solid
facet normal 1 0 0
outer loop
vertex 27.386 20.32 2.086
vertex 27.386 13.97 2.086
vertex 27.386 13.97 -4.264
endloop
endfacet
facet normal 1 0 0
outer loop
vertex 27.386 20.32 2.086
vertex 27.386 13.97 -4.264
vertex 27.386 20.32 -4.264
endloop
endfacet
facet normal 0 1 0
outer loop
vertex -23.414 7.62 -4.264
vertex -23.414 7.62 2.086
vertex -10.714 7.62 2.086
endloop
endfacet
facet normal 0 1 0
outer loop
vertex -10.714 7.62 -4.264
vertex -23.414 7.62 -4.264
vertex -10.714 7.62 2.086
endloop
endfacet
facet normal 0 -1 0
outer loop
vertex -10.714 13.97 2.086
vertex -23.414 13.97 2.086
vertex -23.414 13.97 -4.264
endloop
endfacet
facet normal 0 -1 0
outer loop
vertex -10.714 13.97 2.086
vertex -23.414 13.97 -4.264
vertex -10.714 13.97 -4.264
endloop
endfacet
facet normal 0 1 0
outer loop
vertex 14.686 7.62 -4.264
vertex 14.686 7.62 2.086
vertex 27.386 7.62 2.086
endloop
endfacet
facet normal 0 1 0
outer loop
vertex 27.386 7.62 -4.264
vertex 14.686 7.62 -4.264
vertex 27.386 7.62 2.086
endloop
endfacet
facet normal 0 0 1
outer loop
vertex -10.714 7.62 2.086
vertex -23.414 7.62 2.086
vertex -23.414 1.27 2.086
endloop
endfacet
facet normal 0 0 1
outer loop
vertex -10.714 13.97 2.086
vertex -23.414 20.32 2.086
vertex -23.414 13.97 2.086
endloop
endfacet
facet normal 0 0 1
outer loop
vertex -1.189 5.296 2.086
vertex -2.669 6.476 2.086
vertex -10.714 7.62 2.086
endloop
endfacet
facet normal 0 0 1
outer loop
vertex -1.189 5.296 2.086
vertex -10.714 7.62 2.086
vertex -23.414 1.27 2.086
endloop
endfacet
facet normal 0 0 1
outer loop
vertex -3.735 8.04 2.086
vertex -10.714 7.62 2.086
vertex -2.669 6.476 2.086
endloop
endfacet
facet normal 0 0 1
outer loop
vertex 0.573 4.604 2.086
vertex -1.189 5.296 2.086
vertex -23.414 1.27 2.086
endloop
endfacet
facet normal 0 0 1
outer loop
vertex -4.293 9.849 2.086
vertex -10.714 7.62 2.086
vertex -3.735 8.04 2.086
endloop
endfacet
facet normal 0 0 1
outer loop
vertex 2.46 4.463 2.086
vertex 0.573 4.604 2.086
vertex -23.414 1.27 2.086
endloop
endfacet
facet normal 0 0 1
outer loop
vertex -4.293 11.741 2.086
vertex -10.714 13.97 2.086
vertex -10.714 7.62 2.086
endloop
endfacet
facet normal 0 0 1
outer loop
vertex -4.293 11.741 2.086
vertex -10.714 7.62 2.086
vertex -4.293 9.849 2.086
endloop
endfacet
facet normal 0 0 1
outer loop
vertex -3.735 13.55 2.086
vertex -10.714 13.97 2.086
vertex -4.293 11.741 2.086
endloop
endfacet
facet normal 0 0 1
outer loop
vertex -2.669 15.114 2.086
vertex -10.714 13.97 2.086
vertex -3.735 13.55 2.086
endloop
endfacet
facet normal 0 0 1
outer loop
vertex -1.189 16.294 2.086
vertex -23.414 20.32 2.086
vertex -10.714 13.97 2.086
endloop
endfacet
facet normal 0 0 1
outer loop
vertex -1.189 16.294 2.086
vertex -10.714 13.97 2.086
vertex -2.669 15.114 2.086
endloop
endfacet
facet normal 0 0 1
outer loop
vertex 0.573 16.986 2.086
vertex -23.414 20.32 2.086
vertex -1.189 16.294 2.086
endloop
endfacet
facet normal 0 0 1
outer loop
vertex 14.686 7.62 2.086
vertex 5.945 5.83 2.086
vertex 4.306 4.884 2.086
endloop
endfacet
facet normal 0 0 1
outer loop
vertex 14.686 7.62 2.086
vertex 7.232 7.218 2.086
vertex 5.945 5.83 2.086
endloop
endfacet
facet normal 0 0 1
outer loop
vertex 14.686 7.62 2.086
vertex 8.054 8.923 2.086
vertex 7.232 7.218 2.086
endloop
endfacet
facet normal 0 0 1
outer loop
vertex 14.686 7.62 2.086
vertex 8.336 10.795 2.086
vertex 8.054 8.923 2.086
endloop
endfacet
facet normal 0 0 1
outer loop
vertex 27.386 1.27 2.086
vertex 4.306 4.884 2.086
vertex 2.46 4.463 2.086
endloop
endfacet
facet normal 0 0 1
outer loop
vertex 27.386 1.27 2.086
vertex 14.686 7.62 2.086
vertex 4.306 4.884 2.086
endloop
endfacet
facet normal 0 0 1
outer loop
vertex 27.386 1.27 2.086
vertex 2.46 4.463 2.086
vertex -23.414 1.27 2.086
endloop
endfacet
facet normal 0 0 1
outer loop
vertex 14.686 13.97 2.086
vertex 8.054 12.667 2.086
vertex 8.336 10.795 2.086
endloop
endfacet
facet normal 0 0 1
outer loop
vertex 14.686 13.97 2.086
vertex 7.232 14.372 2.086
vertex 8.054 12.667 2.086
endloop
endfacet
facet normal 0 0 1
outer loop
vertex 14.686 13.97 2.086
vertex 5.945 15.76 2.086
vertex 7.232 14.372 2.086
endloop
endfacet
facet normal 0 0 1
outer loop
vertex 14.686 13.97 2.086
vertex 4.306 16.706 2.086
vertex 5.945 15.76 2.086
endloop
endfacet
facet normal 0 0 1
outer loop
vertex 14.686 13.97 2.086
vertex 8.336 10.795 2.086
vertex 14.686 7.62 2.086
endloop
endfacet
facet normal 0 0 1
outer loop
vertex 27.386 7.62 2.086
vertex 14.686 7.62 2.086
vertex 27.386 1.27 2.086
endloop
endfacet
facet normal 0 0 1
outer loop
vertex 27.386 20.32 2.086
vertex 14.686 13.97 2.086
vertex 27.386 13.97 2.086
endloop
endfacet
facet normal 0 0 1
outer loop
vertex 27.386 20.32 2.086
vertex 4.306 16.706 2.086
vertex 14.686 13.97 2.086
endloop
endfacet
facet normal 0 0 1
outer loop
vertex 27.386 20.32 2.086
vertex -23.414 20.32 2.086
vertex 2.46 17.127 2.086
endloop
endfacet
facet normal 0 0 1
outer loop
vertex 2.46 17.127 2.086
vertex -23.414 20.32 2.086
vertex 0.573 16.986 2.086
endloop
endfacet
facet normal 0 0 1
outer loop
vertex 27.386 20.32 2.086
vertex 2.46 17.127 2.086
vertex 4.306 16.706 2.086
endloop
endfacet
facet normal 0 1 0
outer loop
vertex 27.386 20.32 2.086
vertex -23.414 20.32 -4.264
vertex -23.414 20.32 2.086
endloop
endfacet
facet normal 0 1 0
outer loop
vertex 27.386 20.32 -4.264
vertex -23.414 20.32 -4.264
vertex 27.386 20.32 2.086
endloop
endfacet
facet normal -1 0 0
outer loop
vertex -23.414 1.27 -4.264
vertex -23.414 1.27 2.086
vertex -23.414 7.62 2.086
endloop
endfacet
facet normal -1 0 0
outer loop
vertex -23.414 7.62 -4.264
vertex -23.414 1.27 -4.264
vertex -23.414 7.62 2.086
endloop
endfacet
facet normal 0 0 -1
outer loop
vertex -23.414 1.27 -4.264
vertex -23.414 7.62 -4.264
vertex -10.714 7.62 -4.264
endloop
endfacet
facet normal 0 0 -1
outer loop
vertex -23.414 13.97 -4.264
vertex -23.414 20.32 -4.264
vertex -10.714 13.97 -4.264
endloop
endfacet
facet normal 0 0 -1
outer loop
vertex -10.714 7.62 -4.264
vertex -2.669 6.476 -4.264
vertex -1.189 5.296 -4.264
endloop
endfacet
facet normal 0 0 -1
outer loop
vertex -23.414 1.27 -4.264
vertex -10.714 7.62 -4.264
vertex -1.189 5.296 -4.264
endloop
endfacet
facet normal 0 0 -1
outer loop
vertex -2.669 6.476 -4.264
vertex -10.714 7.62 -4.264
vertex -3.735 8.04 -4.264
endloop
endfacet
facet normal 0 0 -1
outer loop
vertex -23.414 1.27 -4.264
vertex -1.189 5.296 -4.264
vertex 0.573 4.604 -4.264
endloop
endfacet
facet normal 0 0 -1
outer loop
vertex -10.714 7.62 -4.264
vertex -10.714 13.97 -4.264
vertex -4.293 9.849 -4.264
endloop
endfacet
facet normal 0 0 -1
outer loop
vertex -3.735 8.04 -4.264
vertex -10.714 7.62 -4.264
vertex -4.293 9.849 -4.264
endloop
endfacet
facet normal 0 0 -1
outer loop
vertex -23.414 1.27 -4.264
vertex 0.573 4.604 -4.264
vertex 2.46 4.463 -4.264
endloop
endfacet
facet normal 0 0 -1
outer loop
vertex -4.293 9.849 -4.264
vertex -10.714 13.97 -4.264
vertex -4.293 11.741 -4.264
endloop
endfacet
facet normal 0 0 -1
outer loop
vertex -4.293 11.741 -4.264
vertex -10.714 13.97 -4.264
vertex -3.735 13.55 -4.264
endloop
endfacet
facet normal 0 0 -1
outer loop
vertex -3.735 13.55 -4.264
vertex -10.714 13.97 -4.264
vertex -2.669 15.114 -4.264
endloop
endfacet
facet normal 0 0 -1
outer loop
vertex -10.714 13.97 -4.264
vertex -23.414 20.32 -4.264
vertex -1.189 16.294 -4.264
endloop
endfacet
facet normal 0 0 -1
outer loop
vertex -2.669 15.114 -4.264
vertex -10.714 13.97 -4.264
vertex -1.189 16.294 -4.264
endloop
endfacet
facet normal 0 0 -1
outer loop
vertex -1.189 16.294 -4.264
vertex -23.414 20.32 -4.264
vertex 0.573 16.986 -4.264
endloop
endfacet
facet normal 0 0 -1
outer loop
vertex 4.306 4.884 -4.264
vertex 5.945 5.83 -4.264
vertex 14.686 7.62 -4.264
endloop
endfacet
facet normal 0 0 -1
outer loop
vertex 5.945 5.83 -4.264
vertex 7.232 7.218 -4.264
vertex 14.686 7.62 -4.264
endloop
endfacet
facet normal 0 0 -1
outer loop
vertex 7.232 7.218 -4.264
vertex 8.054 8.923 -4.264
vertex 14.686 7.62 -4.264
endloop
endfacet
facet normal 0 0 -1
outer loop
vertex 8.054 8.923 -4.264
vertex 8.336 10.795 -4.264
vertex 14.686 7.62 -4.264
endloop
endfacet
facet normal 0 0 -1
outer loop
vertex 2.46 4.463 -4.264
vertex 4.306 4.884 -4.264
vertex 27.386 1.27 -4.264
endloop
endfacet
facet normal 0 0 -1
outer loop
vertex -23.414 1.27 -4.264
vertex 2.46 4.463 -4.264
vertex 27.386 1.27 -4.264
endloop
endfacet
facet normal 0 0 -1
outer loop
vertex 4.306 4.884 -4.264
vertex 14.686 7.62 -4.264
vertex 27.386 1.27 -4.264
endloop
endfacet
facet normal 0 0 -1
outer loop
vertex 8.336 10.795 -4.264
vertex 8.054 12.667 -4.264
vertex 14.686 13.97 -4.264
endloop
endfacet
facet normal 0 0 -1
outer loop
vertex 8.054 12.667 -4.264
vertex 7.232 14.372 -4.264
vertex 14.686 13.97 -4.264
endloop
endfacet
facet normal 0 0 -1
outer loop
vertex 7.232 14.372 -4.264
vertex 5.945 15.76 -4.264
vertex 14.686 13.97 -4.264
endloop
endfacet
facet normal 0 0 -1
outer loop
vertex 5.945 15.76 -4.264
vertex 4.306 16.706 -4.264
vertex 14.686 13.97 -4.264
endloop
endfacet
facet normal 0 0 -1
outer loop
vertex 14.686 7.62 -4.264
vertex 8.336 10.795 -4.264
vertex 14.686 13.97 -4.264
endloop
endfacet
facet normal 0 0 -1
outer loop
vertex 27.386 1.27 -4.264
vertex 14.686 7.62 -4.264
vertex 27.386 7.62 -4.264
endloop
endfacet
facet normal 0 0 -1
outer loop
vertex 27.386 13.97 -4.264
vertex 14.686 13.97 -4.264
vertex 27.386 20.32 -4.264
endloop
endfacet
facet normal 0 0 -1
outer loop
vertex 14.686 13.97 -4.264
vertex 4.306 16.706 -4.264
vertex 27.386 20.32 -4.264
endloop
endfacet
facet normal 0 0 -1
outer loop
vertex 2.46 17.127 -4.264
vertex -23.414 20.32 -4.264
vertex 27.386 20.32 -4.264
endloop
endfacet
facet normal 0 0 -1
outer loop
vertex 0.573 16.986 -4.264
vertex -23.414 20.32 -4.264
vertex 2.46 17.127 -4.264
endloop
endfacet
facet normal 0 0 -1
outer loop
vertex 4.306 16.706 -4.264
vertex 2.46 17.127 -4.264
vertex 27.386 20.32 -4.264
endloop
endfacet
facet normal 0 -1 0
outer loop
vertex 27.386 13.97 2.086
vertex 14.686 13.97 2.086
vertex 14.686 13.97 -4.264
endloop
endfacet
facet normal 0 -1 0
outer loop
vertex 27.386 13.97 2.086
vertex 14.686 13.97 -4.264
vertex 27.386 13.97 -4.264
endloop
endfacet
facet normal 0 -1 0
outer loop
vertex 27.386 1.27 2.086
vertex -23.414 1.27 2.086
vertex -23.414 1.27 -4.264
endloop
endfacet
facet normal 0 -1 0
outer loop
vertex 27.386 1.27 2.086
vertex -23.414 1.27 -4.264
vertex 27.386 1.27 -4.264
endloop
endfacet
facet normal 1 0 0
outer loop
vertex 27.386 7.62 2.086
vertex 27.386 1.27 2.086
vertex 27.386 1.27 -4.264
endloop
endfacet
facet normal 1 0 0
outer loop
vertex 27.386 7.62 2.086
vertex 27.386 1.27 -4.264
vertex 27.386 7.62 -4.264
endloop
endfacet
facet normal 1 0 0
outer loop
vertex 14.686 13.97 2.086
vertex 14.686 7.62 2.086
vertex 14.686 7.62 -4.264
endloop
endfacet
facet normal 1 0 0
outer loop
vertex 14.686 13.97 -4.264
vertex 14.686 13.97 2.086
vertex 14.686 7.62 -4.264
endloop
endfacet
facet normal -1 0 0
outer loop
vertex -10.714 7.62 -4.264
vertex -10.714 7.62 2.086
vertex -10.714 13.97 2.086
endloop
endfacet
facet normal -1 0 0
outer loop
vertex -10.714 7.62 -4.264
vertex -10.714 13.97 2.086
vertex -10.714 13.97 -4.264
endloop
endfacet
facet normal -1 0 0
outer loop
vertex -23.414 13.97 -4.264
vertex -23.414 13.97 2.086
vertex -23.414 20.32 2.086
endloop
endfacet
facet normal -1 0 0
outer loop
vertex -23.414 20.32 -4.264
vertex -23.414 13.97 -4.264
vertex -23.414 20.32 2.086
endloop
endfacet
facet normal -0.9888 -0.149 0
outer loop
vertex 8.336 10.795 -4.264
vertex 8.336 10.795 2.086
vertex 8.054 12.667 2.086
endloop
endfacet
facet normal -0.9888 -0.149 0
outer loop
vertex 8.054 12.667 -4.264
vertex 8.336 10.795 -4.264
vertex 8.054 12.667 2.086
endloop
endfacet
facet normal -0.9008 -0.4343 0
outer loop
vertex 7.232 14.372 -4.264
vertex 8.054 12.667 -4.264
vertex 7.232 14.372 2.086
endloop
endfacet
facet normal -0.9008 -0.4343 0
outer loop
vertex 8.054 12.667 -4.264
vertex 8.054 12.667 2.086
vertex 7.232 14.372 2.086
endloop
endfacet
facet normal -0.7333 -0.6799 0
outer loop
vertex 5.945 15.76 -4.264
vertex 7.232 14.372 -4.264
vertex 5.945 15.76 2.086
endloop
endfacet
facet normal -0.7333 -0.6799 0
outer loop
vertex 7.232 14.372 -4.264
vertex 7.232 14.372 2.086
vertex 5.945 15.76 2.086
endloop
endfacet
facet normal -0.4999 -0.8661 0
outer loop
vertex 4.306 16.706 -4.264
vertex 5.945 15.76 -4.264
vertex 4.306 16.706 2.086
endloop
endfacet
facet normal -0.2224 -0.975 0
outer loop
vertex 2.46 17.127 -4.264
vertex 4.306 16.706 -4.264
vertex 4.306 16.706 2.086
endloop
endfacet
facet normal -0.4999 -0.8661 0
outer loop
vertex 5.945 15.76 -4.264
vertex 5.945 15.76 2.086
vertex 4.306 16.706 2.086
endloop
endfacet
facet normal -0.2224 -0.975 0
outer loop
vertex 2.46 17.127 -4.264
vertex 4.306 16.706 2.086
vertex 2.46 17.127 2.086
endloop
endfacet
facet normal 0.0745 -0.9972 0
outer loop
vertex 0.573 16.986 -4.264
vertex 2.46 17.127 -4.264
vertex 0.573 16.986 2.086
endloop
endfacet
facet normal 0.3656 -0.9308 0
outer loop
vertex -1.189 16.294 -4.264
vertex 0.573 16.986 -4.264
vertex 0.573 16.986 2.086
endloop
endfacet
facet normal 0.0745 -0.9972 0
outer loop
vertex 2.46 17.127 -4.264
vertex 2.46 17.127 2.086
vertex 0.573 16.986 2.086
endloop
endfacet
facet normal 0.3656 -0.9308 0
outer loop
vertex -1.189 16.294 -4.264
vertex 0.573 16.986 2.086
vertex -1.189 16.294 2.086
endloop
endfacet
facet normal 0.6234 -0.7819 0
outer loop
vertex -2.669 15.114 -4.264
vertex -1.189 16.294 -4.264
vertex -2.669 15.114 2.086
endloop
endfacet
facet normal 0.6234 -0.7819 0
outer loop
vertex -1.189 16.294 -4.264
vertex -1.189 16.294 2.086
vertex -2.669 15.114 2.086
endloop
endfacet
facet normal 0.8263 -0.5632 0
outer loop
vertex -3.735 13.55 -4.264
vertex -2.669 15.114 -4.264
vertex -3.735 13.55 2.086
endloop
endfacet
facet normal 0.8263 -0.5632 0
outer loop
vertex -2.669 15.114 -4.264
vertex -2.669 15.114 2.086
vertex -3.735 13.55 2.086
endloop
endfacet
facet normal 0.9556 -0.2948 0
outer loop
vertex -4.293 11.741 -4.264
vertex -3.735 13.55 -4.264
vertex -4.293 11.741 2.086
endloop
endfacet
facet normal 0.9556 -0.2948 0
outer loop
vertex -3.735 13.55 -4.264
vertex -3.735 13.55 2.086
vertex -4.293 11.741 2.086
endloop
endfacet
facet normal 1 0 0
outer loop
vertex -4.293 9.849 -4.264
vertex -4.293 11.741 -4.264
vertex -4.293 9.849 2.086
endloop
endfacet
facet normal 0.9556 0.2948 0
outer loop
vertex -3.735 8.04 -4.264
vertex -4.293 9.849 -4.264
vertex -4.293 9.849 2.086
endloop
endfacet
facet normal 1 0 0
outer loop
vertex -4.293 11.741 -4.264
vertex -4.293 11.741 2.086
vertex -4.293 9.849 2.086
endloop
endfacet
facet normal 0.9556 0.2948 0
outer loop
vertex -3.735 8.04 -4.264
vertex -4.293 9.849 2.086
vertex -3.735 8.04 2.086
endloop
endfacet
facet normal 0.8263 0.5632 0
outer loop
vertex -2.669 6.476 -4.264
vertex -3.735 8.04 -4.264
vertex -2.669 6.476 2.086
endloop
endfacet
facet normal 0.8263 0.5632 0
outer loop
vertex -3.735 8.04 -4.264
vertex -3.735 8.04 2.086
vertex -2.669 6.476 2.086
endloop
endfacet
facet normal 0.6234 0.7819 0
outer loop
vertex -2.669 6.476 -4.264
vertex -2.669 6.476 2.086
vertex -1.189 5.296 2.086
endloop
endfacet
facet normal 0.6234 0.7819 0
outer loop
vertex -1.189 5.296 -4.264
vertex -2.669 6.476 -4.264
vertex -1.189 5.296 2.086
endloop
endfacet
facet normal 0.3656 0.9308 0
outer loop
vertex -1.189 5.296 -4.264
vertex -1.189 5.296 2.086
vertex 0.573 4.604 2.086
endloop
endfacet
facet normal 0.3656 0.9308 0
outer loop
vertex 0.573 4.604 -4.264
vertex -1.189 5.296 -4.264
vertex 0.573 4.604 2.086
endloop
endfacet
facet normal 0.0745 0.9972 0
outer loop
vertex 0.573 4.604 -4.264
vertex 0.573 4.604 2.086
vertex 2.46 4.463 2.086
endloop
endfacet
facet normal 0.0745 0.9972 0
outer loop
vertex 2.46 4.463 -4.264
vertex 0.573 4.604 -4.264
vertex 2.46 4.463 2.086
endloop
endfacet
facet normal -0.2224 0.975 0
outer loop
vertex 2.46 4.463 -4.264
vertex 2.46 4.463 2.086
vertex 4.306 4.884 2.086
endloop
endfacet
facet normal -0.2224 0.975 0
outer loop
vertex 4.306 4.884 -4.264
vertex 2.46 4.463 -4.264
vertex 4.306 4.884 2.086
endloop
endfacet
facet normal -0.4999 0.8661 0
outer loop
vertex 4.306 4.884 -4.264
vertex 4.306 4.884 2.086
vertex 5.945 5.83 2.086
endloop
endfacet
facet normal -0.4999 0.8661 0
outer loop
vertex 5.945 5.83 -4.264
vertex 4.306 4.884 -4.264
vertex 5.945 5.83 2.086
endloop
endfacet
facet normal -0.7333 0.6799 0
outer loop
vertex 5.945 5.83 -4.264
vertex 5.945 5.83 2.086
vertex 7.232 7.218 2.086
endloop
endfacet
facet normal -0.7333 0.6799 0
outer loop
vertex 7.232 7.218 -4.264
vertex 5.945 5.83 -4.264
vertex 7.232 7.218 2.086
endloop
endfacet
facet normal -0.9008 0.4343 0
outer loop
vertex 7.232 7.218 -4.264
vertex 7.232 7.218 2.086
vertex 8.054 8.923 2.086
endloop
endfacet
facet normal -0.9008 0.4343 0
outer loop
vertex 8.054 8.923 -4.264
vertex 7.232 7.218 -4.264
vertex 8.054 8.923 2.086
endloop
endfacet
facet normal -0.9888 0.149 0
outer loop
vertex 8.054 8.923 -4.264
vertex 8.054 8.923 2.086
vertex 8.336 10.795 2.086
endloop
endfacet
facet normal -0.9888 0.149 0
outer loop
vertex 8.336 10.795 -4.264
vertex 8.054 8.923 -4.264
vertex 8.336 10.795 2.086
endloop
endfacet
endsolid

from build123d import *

# Parameters (mm, degrees)
SKETCH2_W           = 25.4
SKETCH2_H           = 12.7
BOSS_EXTRUDE1_DEPTH = 21.59
SKETCH3_W           = 12.7
SKETCH3_H           = 7.62
BOSS_EXTRUDE2_DEPTH = 12.7
SKETCH4_R           = 6.35
CUT_EXTRUDE1_DEPTH  = 13.7
SKETCH6_W           = 50.8
SKETCH6_H           = 12.7
CUT_EXTRUDE2_DEPTH  = 1.27
SKETCH7_W           = 50.8
SKETCH7_H           = 12.7
CUT_EXTRUDE3_DEPTH  = 1.27
SKETCH8_W           = 50.8
SKETCH8_H           = 19.05
CUT_EXTRUDE4_DEPTH  = 6.35


with BuildPart() as part:
    # Sketch2 → Boss-Extrude1 (new body)
    with BuildSketch(Plane(origin=(0, 0, 0), x_dir=(1, 0, 0), z_dir=(0, 1, 0))):
        with Locations((1.985818182, -2.085878788)):
            Rectangle(SKETCH2_W, SKETCH2_H)
    extrude(amount=BOSS_EXTRUDE1_DEPTH)

    # Sketch3 → Boss-Extrude2 (add)
    with BuildSketch(Plane.XY.offset(8.435878788)):
        with Locations((-17.064181818, 17.78)):
            Rectangle(SKETCH3_W, SKETCH3_H)
        with Locations((-17.064181818, 3.81)):
            Rectangle(SKETCH3_W, SKETCH3_H)
        with Locations((21.035818182, 17.78)):
            Rectangle(SKETCH3_W, SKETCH3_H)
        with Locations((21.035818182, 3.81)):
            Rectangle(SKETCH3_W, SKETCH3_H)
    extrude(amount=-BOSS_EXTRUDE2_DEPTH)

    # Sketch4 → Cut-Extrude1 (cut, through all)
    with BuildSketch(Plane.XY.offset(8.435878788)):
        with Locations((1.985818182, 10.795)):
            Circle(SKETCH4_R)
    extrude(amount=-CUT_EXTRUDE1_DEPTH, mode=Mode.SUBTRACT)

    # Sketch6 → Cut-Extrude2 (cut)
    with BuildSketch(Plane(origin=(0, 21.59, 0), x_dir=(1, 0, 0), z_dir=(0, 1, 0))):
        with Locations((1.985818182, -2.085878788)):
            Rectangle(SKETCH6_W, SKETCH6_H)
    extrude(amount=-CUT_EXTRUDE2_DEPTH, mode=Mode.SUBTRACT)

    # Sketch7 → Cut-Extrude3 (cut)
    with BuildSketch(Plane.XZ):
        with Locations((1.985818182, 2.085878788)):
            Rectangle(SKETCH7_W, SKETCH7_H)
    extrude(amount=-CUT_EXTRUDE3_DEPTH, mode=Mode.SUBTRACT)

    # Sketch8 → Cut-Extrude4 (cut)
    with BuildSketch(Plane.XY.offset(8.435878788)):
        with Locations((1.985818182, 10.795)):
            Rectangle(SKETCH8_W, SKETCH8_H)
    extrude(amount=-CUT_EXTRUDE4_DEPTH, mode=Mode.SUBTRACT)


solid = part.part
